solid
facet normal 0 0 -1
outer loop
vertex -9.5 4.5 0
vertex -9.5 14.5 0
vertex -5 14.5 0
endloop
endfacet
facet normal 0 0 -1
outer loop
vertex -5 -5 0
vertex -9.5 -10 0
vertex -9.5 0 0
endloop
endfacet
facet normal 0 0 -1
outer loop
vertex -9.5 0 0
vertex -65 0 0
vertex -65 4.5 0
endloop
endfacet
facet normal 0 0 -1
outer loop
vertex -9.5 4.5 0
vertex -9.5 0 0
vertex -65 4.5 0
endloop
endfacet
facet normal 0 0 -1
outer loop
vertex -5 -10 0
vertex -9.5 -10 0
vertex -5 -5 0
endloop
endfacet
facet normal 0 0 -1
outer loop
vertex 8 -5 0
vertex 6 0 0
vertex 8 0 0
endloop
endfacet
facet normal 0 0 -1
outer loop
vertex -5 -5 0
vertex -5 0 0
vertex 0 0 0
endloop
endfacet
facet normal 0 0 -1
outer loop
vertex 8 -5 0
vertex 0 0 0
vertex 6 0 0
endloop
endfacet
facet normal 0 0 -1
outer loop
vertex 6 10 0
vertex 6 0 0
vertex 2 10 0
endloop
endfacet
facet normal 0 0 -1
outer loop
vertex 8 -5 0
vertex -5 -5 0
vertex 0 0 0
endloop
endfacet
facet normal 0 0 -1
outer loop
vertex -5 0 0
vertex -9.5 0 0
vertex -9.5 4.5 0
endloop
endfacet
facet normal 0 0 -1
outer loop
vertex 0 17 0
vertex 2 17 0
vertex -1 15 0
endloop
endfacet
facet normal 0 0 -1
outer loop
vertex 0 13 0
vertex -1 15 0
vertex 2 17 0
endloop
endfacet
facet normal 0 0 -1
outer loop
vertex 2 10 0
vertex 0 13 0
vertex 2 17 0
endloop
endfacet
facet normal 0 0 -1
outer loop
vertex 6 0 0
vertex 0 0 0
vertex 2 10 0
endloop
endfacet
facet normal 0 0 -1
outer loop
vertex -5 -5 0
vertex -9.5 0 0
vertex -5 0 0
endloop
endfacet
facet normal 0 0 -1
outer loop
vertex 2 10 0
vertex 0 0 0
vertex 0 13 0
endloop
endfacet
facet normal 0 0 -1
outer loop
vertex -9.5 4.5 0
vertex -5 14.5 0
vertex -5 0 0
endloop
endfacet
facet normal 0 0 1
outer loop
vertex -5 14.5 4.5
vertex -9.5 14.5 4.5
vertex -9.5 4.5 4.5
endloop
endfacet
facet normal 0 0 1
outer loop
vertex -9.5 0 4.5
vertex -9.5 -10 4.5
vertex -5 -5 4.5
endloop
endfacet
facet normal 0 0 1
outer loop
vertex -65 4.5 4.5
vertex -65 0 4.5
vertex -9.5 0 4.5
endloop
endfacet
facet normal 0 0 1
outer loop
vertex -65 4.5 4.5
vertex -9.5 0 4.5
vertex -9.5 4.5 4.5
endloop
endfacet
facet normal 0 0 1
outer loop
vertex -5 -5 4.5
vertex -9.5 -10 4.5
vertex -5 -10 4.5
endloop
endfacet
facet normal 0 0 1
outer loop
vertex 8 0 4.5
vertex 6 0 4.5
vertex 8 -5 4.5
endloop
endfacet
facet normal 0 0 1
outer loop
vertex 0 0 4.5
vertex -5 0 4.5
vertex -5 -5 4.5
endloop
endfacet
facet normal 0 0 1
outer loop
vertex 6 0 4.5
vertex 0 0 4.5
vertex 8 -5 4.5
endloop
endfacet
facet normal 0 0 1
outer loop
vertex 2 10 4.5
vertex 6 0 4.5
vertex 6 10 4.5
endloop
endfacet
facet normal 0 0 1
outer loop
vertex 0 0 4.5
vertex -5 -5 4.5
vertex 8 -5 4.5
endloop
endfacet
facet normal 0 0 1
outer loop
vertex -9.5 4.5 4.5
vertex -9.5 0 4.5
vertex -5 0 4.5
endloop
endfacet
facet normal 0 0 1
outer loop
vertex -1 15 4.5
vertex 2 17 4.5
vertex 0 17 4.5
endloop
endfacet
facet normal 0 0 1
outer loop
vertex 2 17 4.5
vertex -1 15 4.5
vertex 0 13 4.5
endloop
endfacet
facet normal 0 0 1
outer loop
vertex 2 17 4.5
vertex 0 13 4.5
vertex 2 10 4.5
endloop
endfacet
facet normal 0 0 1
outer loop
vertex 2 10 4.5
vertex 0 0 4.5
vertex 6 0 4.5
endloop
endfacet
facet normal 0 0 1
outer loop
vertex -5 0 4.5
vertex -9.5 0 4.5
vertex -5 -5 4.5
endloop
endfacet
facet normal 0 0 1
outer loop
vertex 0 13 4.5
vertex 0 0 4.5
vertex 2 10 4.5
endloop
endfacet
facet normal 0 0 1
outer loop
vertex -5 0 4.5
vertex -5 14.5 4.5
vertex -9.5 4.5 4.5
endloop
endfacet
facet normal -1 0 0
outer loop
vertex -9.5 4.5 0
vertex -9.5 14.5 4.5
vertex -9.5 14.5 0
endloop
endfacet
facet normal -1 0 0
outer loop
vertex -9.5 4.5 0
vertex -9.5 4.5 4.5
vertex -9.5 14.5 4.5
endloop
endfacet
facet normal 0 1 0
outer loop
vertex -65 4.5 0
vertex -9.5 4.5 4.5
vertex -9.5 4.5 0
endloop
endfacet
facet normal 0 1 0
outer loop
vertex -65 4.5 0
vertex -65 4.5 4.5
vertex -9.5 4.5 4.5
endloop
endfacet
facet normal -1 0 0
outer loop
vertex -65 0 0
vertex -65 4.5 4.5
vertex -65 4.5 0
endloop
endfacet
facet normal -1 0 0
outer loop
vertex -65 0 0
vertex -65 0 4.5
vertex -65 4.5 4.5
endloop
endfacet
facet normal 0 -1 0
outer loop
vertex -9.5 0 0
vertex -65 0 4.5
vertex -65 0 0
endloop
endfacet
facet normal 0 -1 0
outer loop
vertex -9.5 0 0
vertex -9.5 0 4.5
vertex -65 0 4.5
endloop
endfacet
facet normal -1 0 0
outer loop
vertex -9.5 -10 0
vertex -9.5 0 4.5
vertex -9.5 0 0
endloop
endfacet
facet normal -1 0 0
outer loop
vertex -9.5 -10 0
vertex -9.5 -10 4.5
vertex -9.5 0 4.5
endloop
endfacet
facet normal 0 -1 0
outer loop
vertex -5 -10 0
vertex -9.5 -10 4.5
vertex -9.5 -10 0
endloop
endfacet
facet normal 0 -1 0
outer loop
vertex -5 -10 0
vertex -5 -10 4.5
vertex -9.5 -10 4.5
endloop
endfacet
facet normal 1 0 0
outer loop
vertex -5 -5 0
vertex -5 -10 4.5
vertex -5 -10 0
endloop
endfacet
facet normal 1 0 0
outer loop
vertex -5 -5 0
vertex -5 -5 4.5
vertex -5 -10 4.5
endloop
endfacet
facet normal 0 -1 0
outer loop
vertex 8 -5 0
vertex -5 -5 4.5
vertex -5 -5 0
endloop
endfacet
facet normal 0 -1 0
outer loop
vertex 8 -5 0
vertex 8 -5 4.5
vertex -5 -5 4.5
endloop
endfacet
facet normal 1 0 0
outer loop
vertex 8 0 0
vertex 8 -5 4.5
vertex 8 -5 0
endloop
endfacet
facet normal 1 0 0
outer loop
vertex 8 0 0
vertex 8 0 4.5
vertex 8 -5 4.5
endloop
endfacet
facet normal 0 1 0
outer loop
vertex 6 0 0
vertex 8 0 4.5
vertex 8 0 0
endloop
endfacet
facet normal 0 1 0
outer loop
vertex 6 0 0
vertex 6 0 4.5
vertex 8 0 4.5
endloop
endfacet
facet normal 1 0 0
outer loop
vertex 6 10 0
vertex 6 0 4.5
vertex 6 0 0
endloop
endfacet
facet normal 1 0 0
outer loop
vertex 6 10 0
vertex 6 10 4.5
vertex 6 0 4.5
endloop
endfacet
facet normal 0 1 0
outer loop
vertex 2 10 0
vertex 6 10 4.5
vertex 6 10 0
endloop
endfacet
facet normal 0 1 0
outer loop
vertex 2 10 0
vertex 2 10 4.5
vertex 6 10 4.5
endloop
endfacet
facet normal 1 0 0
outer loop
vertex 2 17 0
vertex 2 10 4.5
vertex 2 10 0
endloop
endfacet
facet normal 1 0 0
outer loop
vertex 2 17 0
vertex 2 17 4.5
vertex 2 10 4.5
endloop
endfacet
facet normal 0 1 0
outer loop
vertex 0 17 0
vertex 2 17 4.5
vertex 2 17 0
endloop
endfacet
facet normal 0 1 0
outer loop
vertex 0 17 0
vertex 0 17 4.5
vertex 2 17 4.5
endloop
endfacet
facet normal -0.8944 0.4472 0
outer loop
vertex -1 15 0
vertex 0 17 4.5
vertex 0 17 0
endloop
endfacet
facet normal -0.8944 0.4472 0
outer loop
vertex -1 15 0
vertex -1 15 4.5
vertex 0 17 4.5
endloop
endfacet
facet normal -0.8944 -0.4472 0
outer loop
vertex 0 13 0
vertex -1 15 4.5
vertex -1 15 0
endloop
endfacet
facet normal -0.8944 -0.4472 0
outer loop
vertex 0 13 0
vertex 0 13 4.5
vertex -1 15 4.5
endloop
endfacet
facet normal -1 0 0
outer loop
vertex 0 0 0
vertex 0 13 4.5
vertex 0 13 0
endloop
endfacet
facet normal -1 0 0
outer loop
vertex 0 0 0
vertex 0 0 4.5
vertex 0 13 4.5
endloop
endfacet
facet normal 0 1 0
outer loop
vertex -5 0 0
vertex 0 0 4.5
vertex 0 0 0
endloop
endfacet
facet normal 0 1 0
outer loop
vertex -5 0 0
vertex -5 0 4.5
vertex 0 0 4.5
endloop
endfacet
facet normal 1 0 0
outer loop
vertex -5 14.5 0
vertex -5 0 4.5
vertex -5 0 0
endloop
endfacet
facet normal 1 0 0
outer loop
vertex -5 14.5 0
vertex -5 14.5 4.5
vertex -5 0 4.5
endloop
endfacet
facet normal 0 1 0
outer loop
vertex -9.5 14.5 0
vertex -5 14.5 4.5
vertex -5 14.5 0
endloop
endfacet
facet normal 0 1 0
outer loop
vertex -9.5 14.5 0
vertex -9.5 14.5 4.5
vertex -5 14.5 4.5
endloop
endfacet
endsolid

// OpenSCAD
$fs=1/2;
$fa=1/2;
linear_extrude(height=4.5) {
  square([6,10]);
  square([2,17]);
  //translate([0,15]) circle(r=2.5);
  polygon([[0,17],[-1,15],[0,13]]);
  translate([-5,-5]) square([3+5+5,5]);
  translate([-60-5,0]) square([60,4.5]);
  translate([-5-4.5,-10])square([4.5,24.5]);
}
